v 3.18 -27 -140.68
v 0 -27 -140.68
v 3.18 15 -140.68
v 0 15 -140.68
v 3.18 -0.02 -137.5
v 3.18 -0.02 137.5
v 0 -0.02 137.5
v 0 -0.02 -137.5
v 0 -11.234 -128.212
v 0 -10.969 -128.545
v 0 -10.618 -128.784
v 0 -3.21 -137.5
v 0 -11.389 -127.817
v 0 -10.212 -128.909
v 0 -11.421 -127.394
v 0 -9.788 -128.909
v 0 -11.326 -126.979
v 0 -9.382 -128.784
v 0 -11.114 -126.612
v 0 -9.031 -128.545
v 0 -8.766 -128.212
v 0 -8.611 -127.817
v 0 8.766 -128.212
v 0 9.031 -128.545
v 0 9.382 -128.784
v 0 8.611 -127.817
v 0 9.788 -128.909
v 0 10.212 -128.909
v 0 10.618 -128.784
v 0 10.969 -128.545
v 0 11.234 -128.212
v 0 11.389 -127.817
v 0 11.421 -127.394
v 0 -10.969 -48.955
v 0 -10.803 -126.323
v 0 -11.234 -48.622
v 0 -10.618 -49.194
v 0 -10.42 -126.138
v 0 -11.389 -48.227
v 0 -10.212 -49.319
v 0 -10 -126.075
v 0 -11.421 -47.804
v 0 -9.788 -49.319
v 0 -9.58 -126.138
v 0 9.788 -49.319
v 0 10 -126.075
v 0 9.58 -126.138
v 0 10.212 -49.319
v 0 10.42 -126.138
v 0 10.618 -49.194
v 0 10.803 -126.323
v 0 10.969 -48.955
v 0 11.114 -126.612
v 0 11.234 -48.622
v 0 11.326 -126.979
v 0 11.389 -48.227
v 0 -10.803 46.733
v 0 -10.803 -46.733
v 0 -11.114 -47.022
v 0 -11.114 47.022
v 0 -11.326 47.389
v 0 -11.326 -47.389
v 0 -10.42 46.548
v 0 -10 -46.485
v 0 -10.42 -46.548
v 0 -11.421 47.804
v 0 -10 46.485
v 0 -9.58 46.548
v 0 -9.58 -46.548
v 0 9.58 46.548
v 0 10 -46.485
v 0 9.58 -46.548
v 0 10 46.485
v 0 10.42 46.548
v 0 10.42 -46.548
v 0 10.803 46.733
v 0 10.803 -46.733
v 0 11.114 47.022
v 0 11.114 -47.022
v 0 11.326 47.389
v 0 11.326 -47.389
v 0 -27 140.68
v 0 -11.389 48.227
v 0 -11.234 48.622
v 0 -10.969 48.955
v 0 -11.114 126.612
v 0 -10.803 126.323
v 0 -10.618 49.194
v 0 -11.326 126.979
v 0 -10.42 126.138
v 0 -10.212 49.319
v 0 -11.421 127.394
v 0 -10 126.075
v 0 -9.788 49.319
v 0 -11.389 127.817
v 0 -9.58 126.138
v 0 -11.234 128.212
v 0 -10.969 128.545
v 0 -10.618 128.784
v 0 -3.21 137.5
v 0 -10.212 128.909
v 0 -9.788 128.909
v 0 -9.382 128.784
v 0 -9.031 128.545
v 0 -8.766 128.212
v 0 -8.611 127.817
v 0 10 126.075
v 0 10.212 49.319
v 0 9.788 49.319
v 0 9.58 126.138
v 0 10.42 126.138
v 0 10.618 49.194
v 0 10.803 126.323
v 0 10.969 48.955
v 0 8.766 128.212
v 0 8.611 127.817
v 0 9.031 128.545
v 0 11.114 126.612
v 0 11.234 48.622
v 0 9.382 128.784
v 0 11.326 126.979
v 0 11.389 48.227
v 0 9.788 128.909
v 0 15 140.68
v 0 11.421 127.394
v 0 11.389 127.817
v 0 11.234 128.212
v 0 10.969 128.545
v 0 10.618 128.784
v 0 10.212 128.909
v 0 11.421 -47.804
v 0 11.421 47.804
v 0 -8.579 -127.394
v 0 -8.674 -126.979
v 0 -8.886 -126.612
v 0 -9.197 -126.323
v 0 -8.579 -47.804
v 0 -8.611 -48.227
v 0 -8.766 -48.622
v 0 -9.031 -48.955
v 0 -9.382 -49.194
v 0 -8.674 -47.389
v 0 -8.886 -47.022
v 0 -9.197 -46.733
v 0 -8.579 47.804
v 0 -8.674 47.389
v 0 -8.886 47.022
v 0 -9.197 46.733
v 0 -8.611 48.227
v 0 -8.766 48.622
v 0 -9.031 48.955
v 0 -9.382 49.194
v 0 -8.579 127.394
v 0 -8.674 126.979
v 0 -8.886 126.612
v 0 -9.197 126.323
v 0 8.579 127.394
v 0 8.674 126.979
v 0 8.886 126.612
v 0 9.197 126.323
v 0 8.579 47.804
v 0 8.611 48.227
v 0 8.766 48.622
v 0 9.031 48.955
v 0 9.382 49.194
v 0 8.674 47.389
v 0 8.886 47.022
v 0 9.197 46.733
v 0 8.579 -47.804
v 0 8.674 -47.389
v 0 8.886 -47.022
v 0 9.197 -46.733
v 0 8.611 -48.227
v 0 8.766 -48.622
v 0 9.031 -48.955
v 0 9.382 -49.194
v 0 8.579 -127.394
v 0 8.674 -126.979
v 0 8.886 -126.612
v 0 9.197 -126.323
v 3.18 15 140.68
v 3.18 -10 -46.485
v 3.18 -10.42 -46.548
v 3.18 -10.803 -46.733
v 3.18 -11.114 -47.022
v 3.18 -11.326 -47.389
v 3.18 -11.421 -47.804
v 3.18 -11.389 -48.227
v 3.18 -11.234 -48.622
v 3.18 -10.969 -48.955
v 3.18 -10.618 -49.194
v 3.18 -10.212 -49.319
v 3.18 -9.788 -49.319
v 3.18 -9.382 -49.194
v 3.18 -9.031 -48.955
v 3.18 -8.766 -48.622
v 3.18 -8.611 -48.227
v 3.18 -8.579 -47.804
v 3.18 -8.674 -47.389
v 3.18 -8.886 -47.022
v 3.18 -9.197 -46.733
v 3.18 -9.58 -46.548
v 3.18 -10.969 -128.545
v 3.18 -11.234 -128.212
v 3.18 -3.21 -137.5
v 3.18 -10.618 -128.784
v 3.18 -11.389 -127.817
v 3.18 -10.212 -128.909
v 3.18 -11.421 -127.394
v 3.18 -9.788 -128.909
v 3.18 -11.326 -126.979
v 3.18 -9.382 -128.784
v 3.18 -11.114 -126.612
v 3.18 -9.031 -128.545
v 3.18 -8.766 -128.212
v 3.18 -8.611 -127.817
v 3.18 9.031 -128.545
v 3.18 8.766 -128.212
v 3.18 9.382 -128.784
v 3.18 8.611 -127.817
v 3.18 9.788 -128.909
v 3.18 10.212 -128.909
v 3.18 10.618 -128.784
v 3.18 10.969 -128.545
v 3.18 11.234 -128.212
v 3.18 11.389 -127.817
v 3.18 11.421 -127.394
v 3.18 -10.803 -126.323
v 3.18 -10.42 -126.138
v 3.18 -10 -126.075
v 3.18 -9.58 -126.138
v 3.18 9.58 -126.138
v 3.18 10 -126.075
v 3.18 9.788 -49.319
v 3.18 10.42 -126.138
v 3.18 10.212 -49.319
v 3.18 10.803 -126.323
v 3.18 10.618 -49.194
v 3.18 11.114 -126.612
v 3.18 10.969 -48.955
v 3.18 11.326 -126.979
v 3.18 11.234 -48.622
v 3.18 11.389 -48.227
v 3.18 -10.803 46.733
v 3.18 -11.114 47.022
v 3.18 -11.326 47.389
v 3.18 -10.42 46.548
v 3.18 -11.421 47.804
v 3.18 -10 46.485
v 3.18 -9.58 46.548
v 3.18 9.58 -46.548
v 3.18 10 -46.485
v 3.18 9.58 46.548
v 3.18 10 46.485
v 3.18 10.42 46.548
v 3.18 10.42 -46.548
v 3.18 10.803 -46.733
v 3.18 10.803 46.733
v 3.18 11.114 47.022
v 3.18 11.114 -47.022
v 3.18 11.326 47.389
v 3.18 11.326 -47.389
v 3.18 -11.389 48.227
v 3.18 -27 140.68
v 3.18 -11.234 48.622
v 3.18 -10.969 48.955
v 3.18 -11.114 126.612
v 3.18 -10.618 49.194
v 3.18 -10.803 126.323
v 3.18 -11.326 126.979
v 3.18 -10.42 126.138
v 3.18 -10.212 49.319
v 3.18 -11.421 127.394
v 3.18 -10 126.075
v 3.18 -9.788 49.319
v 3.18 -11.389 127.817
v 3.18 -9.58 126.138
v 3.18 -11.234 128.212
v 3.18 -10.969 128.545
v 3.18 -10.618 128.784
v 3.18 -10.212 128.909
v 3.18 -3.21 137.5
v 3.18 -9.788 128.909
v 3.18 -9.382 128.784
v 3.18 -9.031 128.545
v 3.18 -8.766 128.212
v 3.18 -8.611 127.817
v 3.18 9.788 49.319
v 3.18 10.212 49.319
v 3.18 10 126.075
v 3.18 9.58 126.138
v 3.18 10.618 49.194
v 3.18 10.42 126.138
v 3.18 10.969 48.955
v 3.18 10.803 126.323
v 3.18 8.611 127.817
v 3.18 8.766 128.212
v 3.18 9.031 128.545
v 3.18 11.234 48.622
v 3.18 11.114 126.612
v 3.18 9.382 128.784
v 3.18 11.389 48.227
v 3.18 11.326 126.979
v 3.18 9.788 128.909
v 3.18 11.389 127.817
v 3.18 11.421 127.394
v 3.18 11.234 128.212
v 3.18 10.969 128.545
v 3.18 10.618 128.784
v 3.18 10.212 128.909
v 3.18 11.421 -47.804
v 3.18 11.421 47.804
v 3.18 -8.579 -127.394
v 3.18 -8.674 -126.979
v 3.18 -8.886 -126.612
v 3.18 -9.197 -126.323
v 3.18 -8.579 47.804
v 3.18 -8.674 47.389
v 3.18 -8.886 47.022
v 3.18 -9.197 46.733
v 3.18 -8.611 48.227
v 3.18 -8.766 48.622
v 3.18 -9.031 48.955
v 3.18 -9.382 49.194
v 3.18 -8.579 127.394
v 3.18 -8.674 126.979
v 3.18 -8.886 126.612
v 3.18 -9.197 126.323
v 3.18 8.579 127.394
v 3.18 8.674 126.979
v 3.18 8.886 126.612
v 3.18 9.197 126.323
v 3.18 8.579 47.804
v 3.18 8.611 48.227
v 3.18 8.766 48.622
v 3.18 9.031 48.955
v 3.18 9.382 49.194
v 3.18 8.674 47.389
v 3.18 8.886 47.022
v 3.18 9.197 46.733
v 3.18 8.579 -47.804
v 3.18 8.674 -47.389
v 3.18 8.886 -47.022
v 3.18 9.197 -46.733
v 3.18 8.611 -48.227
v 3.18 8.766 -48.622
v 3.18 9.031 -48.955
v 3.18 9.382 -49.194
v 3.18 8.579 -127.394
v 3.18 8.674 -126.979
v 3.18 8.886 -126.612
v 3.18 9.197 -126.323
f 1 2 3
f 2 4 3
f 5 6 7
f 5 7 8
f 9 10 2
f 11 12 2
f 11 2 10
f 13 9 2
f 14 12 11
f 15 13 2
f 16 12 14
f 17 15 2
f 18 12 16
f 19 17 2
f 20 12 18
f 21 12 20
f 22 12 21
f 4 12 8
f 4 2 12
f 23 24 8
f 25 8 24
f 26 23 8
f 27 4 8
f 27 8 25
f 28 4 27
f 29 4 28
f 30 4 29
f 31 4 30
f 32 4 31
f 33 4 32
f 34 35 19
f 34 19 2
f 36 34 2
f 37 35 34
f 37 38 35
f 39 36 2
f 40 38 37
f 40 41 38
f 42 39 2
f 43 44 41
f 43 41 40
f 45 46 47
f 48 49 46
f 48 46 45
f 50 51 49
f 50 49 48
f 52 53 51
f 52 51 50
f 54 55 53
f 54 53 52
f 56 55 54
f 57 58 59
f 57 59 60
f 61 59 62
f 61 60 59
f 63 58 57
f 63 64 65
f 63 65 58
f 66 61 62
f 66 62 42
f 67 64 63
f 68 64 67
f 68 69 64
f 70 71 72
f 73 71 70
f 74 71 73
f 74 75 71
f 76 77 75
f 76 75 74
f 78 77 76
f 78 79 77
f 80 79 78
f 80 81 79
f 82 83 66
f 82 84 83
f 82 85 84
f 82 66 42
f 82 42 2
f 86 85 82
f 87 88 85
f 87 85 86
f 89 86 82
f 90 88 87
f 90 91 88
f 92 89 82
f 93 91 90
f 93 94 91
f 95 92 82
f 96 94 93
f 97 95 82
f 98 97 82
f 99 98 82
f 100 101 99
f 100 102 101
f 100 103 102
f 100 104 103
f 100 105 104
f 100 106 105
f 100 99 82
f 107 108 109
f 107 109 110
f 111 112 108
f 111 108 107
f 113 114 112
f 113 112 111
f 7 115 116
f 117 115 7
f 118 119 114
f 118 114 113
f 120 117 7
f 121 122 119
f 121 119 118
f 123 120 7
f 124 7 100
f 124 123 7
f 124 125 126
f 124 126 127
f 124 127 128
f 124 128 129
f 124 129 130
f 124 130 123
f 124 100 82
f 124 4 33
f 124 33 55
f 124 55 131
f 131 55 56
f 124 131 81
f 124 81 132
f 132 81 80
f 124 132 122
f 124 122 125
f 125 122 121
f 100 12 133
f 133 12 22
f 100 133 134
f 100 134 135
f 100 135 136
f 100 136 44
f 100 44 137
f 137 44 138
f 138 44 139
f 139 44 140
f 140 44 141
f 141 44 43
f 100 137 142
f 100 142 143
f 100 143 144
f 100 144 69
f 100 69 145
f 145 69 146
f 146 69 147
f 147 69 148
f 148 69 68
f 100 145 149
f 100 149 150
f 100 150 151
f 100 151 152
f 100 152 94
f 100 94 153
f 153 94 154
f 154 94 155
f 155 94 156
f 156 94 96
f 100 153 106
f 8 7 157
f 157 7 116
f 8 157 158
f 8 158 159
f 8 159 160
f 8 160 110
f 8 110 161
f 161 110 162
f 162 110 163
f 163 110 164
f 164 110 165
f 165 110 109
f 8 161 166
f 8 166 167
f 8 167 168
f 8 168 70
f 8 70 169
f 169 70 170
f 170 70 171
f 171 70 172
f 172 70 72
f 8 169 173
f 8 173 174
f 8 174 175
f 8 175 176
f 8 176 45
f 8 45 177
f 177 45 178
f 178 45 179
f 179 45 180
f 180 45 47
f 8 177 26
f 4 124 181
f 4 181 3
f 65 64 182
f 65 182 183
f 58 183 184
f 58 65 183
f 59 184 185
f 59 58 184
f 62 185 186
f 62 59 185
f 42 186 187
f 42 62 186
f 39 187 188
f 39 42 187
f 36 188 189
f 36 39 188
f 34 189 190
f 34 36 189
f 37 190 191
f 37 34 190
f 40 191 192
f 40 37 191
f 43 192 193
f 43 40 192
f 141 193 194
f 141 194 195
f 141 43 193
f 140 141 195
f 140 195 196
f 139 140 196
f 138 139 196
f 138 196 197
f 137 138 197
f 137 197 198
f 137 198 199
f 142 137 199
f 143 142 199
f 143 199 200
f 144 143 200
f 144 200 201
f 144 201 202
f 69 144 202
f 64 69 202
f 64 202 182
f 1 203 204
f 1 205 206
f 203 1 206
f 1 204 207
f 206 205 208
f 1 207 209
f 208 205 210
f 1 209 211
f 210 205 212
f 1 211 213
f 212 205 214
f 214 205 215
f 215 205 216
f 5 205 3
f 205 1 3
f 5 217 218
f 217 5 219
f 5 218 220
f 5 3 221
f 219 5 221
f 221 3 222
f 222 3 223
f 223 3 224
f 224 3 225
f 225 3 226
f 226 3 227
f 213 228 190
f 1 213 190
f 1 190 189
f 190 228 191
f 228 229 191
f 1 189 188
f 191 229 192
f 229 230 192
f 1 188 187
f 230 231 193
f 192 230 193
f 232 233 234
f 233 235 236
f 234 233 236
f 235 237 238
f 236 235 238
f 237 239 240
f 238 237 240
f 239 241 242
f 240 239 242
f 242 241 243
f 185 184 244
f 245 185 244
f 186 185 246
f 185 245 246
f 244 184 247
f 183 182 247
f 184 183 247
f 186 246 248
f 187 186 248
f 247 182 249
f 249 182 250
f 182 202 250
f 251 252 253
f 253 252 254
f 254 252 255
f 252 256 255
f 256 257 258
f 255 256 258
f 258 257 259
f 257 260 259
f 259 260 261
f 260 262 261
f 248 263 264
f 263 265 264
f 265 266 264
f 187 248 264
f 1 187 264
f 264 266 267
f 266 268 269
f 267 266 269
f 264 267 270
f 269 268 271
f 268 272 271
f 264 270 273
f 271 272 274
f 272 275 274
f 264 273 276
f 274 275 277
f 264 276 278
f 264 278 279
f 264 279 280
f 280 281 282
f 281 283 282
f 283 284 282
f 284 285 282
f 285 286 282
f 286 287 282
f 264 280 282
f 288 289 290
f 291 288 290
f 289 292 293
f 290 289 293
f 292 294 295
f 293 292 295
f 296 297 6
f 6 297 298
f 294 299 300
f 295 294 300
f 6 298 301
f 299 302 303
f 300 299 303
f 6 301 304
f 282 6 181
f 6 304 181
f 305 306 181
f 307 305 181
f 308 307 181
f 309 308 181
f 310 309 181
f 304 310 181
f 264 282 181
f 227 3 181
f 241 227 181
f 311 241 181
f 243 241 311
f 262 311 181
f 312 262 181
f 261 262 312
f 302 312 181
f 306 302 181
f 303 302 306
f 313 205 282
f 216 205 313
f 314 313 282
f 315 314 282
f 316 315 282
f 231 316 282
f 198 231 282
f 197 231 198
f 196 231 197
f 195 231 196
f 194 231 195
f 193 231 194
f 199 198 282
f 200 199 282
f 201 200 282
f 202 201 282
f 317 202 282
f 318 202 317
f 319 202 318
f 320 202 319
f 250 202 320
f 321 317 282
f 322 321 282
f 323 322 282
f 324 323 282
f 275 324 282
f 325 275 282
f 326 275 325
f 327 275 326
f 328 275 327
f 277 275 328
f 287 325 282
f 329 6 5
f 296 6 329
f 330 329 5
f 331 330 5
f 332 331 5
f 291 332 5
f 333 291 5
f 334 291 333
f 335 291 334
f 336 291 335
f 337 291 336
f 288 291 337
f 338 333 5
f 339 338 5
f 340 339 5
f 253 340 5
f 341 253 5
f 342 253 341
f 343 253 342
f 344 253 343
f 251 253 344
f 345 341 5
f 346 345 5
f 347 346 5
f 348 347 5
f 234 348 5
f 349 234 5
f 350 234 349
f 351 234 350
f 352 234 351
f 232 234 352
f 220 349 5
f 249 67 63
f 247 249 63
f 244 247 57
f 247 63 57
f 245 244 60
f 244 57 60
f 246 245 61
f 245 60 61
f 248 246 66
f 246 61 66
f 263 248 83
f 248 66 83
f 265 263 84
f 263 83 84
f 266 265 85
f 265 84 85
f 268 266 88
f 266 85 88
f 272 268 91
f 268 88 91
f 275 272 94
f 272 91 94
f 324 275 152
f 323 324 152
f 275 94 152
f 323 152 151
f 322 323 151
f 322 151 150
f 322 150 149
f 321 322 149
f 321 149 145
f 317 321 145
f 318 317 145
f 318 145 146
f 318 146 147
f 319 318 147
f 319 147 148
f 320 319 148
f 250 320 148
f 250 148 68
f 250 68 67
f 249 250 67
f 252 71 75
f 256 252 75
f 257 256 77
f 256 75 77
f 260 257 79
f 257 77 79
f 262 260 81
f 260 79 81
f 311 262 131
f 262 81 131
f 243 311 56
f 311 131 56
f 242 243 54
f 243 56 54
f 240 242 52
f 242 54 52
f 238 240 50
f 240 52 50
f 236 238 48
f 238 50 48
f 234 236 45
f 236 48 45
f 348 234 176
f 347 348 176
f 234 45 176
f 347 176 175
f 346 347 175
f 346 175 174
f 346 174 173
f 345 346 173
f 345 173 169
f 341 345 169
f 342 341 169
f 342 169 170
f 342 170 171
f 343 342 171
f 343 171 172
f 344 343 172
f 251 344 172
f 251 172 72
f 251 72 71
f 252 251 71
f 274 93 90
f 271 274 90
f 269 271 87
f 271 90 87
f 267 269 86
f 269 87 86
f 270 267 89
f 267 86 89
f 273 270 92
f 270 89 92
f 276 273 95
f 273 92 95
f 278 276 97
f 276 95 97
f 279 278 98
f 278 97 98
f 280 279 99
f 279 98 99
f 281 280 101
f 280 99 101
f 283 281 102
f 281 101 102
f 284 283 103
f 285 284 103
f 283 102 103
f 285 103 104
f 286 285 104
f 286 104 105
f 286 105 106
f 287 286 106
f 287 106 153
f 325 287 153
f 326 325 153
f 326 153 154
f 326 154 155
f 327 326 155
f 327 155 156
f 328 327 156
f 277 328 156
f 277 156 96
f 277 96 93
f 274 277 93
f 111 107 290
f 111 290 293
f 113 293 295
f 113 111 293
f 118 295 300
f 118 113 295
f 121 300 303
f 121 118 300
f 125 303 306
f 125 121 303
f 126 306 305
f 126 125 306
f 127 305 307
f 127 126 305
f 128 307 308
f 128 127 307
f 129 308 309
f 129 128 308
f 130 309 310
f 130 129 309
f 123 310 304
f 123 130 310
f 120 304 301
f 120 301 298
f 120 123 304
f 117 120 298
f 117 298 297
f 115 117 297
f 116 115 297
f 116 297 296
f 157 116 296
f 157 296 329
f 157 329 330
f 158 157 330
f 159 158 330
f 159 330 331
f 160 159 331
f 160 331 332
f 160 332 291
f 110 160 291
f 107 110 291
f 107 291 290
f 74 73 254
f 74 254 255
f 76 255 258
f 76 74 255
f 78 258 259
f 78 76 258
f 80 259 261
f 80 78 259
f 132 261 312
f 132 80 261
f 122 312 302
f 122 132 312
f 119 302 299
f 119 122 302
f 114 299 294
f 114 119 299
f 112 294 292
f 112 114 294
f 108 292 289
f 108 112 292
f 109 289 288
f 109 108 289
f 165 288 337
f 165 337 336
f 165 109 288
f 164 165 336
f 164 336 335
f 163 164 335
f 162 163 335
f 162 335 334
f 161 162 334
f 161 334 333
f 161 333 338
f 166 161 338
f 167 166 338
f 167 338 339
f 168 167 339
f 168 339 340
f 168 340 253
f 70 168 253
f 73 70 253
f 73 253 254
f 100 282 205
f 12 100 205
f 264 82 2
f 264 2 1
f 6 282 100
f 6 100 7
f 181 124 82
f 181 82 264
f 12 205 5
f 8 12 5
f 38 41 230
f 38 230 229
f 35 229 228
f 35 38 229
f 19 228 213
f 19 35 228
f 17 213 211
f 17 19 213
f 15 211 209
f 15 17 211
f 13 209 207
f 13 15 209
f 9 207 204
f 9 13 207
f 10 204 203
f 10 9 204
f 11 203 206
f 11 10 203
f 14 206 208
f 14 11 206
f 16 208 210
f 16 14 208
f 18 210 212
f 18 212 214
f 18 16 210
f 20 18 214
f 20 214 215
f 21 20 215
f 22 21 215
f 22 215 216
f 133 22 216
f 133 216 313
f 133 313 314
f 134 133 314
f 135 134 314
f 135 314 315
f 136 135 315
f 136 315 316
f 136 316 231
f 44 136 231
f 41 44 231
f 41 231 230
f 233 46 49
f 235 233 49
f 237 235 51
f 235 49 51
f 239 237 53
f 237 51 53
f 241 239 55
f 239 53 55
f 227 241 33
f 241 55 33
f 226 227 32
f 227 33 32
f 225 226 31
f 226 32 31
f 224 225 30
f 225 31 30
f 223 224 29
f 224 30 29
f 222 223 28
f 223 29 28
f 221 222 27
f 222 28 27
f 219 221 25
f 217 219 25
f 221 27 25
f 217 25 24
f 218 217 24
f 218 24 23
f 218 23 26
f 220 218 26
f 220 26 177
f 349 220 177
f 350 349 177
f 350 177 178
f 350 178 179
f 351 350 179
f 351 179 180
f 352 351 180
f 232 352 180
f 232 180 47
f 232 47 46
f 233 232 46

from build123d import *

# Parameters (mm, degrees)
SKETCH1_W               = 281.36
SKETCH1_H               = 30
BOSS_EXTRUDE1_DEPTH     = 3.18
CUT_EXTRUDE1_REACH      = 143.513
SKETCH2_R               = 1.425
MIRROR2_COPY_1_REACH    = 143.513
MIRROR2_COPY_1_SKETCH_R = 1.425
SKETCH3_W               = 275
SKETCH3_H               = 3.19
CUT_EXTRUDE2_DEPTH      = 3.18
SKETCH4_W               = 3.18
SKETCH4_H               = 281.36
BOSS_EXTRUDE2_DEPTH     = 12


with BuildPart() as part:
    # Sketch1 → Boss-Extrude1 (new body)
    with BuildSketch(Plane(origin=(0, 0, 0), x_dir=(0, 0, -1), z_dir=(1, 0, 0))):
        Rectangle(SKETCH1_W, SKETCH1_H)
    extrude(amount=BOSS_EXTRUDE1_DEPTH)

    # Sketch2 → Cut-Extrude1 (cut, up to next)
    with BuildSketch(Plane.ZY, mode=Mode.PRIVATE) as cut_extrude1_sk1:
        with Locations((-127.5, 10)):
            Circle(SKETCH2_R)
    cut_extrude1_tool1 = extrude(cut_extrude1_sk1.sketch, amount=-CUT_EXTRUDE1_REACH, mode=Mode.PRIVATE) & part.part
    # Sketch2 → Cut-Extrude1 (cut, up to next)
    with BuildSketch(Plane.ZY, mode=Mode.PRIVATE) as cut_extrude1_sk2:
        with Locations((-47.91, 10)):
            Circle(SKETCH2_R)
    cut_extrude1_tool2 = extrude(cut_extrude1_sk2.sketch, amount=-CUT_EXTRUDE1_REACH, mode=Mode.PRIVATE) & part.part
    cut_extrude1_1 = cut_extrude1_tool1.solids().sort_by_distance((0, 10, -127.5))[0]
    add(cut_extrude1_1, mode=Mode.SUBTRACT)
    cut_extrude1_2 = cut_extrude1_tool2.solids().sort_by_distance((0, 10, -47.91))[0]
    add(cut_extrude1_2, mode=Mode.SUBTRACT)
    cut_extrude1 = cut_extrude1_1 + cut_extrude1_2  # Cut-Extrude1 as one shape, for the pattern or mirror that repeats it

    # Mirror1: Cut-Extrude1 across plane
    add(cut_extrude1.mirror(Plane.ZX), mode=Mode.SUBTRACT)

    # Mirror2: Cut-Extrude1 across plane
    add(cut_extrude1.mirror(Plane.XY), mode=Mode.SUBTRACT)

    # Mirror2 copy 1 sketch → Mirror2 copy 1 (cut, up to next)
    with BuildSketch(Plane(origin=(0, 0, 0), x_dir=(0, 0, -1), z_dir=(-1, 0, 0)), mode=Mode.PRIVATE) as mirror2_copy_1_sk1:
        with Locations((-127.5, 10)):
            Circle(MIRROR2_COPY_1_SKETCH_R)
    mirror2_copy_1_tool1 = extrude(mirror2_copy_1_sk1.sketch, amount=-MIRROR2_COPY_1_REACH, mode=Mode.PRIVATE) & part.part
    # Mirror2 copy 1 sketch → Mirror2 copy 1 (cut, up to next)
    with BuildSketch(Plane(origin=(0, 0, 0), x_dir=(0, 0, -1), z_dir=(-1, 0, 0)), mode=Mode.PRIVATE) as mirror2_copy_1_sk2:
        with Locations((-47.91, 10)):
            Circle(MIRROR2_COPY_1_SKETCH_R)
    mirror2_copy_1_tool2 = extrude(mirror2_copy_1_sk2.sketch, amount=-MIRROR2_COPY_1_REACH, mode=Mode.PRIVATE) & part.part
    add(mirror2_copy_1_tool1.solids().sort_by_distance((0, -10, 127.5))[0], mode=Mode.SUBTRACT)
    add(mirror2_copy_1_tool2.solids().sort_by_distance((0, -10, 47.91))[0], mode=Mode.SUBTRACT)

    # Sketch3 → Cut-Extrude2 (cut)
    with BuildSketch(Plane(origin=(3.18, 0, 0), x_dir=(0, 0, -1), z_dir=(1, 0, 0))):
        with Locations((0, -1.615)):
            Rectangle(SKETCH3_W, SKETCH3_H)
    extrude(amount=-CUT_EXTRUDE2_DEPTH, mode=Mode.SUBTRACT)

    # Sketch4 → Boss-Extrude2 (add)
    with BuildSketch(Plane.XZ.offset(15)):
        with Locations((1.59, 0)):
            Rectangle(SKETCH4_W, SKETCH4_H)
    extrude(amount=BOSS_EXTRUDE2_DEPTH)


solid = part.part
